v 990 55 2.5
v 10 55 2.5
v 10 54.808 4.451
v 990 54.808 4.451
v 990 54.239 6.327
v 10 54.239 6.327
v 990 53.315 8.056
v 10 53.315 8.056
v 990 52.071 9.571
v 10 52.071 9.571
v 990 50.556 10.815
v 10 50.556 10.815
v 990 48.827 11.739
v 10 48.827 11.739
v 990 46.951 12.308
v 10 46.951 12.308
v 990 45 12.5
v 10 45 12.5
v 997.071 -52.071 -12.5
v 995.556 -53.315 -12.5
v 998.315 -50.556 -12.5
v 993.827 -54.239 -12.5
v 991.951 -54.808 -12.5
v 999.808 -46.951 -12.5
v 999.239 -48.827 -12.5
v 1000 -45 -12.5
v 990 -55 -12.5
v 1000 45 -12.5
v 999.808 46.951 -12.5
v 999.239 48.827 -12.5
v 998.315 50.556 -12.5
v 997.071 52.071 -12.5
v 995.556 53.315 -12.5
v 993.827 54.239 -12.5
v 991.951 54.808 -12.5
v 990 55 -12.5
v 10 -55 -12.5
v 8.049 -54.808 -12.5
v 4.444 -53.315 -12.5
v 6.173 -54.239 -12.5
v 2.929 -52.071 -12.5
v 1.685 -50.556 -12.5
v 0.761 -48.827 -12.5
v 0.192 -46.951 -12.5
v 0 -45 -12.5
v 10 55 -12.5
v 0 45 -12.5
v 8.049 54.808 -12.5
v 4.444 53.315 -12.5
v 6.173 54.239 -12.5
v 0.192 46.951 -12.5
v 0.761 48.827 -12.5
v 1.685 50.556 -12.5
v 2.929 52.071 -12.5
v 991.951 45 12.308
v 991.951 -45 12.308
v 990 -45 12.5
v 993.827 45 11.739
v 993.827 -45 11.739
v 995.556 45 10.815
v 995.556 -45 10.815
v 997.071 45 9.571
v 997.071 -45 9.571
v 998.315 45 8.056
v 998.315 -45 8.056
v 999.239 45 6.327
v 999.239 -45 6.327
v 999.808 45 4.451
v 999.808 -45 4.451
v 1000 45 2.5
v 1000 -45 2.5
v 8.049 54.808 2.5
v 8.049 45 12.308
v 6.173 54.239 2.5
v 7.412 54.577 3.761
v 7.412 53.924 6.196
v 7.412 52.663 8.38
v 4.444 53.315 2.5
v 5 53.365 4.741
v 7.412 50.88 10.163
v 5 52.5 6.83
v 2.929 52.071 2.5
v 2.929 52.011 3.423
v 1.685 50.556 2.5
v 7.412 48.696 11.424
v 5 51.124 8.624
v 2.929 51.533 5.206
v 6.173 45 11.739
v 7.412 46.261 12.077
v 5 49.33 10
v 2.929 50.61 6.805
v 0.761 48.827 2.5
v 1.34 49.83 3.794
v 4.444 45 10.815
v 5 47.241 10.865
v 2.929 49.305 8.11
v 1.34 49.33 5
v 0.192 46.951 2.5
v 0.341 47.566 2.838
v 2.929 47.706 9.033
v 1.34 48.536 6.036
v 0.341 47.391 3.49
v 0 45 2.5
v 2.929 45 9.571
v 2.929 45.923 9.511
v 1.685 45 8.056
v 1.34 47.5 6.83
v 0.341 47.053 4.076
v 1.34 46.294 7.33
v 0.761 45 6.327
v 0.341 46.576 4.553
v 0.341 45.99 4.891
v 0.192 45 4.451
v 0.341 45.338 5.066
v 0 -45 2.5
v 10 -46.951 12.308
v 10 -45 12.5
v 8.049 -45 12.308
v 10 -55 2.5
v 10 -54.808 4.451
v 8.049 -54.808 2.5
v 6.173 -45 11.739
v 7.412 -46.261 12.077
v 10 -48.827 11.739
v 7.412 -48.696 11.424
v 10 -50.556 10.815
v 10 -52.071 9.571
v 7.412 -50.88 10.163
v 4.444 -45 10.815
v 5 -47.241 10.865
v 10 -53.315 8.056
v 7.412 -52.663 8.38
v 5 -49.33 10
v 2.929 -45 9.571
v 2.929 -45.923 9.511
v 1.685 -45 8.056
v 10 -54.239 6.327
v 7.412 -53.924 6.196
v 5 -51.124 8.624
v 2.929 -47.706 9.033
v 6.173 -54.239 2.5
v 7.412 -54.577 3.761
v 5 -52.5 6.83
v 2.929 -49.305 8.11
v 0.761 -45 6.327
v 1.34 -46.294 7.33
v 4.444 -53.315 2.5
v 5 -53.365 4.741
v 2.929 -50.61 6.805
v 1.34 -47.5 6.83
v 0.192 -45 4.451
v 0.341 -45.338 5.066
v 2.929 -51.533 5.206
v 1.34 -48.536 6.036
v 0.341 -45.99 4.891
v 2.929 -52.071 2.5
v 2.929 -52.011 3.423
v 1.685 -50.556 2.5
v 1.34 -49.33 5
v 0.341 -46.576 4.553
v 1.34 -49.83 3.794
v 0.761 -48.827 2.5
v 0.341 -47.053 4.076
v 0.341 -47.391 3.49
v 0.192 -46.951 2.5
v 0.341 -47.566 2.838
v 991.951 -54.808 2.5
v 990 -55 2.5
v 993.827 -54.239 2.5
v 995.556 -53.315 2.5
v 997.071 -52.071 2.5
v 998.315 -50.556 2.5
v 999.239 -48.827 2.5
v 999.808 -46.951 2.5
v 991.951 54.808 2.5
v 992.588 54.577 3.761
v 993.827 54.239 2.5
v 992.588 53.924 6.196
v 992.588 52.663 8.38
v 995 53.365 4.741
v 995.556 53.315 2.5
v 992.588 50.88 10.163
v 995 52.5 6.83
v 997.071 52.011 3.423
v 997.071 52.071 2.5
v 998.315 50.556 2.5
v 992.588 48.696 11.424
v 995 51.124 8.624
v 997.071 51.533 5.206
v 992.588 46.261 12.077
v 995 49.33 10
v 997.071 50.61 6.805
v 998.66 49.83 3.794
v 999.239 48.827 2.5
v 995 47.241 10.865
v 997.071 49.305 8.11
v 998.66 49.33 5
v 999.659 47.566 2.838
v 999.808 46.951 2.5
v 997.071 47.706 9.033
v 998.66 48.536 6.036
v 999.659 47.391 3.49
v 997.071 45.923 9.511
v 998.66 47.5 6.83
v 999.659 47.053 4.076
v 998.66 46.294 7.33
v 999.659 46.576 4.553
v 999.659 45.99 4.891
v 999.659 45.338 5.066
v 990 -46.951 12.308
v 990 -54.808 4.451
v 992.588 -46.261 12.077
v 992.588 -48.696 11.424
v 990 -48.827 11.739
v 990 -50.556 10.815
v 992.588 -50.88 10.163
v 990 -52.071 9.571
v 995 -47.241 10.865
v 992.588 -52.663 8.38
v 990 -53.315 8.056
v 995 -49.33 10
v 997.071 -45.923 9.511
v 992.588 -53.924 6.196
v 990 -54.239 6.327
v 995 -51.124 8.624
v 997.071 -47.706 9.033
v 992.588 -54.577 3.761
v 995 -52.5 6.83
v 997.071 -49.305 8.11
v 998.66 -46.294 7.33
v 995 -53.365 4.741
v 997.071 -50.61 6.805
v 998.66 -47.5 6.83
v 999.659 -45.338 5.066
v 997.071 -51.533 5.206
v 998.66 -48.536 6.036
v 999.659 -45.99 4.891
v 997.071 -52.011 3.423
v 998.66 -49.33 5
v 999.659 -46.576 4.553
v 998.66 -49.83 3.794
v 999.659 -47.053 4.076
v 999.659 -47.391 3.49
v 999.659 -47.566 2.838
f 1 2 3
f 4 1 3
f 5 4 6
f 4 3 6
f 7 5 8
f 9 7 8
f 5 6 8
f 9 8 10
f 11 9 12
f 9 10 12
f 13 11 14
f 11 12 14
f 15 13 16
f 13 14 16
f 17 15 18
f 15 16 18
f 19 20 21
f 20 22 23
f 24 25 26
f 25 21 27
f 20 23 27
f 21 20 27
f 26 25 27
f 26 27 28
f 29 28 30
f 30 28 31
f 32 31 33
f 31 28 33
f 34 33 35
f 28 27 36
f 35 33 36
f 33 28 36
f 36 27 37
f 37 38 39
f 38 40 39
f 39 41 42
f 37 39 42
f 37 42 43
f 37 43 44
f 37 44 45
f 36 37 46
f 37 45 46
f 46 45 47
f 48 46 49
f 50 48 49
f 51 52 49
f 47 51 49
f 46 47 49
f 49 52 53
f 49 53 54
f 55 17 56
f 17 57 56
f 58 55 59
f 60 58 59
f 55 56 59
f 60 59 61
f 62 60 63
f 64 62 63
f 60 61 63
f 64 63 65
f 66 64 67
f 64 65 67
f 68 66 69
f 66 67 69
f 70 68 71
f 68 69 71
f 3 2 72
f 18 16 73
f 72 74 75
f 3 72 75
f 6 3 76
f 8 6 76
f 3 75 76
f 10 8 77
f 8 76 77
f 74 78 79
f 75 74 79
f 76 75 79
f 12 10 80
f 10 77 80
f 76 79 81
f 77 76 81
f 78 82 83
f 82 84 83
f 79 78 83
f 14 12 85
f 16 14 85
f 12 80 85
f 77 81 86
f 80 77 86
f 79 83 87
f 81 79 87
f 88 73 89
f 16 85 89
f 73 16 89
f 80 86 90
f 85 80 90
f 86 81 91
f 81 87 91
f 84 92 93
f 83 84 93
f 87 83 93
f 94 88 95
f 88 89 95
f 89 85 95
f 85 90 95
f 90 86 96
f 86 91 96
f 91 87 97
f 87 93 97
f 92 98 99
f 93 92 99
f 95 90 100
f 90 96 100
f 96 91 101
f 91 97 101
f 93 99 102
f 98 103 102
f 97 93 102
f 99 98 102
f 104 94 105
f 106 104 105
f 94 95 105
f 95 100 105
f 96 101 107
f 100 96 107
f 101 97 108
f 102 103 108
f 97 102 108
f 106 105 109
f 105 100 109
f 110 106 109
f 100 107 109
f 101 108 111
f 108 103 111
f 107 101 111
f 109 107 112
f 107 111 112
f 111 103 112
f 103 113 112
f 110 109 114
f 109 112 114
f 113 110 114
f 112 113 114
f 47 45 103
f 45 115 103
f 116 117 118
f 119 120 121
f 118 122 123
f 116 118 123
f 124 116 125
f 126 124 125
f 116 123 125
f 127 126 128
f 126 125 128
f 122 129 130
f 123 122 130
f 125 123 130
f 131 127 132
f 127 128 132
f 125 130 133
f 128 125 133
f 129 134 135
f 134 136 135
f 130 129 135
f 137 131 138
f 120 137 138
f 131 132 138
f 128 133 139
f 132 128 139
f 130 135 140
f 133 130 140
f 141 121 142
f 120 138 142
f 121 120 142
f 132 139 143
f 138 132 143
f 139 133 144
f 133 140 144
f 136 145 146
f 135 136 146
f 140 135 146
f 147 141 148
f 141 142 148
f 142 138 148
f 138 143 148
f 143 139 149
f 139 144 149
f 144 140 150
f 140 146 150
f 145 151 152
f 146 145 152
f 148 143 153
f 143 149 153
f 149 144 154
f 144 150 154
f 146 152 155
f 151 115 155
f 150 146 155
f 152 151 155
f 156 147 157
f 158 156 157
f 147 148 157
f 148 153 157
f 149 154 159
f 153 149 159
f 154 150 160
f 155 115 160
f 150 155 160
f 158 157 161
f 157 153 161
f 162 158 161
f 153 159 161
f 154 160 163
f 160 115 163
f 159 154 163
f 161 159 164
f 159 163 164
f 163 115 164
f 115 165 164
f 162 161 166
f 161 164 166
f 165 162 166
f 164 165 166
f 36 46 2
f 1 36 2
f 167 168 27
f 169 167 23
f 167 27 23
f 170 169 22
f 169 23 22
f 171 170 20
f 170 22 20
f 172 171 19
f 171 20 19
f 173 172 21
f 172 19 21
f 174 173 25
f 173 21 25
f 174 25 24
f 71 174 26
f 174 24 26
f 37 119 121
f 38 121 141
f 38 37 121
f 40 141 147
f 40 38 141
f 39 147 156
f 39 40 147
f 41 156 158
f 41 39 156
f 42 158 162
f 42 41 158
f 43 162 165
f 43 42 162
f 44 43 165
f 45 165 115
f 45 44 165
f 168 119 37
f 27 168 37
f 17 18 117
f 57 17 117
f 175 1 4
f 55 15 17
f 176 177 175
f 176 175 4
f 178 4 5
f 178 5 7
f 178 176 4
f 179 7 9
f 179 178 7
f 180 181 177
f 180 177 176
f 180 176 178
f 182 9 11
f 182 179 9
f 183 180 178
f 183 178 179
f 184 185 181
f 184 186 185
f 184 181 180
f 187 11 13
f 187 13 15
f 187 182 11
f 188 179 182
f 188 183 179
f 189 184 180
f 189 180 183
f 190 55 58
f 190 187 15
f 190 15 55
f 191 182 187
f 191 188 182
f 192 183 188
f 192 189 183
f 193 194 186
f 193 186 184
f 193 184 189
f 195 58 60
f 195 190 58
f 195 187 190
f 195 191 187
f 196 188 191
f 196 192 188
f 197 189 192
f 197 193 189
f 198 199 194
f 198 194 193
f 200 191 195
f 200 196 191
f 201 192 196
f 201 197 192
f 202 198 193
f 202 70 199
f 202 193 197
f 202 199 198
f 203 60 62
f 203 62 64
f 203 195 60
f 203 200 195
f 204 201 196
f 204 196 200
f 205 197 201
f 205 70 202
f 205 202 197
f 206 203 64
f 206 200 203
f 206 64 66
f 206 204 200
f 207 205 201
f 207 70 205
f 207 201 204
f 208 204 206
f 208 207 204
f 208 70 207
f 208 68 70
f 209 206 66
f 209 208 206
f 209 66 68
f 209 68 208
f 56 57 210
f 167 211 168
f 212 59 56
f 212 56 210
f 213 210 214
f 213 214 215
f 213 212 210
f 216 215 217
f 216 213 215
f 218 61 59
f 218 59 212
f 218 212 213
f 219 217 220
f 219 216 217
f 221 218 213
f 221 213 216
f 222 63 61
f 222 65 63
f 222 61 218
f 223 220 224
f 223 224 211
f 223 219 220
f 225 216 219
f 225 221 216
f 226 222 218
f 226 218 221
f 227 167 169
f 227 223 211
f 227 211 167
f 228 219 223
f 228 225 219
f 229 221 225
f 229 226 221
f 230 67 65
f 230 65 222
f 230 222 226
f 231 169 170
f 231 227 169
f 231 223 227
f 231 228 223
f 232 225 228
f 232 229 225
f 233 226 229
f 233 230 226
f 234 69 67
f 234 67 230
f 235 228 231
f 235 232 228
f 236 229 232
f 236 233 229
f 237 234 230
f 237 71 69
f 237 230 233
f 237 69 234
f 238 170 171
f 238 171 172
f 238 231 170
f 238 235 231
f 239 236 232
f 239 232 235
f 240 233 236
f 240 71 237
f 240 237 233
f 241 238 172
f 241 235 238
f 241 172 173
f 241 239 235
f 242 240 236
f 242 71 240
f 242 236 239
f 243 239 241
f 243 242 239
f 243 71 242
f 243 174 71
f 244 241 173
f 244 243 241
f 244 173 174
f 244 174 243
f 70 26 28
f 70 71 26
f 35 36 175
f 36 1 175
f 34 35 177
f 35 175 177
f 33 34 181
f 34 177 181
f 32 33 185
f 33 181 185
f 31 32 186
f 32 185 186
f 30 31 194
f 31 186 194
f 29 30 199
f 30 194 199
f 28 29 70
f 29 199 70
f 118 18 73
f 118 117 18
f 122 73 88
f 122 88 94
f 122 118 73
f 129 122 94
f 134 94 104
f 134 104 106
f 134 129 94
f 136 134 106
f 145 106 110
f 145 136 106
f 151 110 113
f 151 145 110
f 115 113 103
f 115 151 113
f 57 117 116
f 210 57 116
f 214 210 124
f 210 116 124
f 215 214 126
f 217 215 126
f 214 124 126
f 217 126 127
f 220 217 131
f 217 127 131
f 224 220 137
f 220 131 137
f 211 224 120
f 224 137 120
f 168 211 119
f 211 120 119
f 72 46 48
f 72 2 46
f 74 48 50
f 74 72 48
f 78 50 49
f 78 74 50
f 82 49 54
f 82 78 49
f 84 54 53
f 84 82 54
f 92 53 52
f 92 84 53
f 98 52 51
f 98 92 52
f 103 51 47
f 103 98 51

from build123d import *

# Parameters (mm, degrees)
F1_DEPTH = 1000
F2_R     = 10


with BuildPart() as f1:
    # F0 (on Right) → F1 (new body)
    with BuildSketch(Plane.YZ):
        with BuildLine():
            Line((-55, -12.5), (55, -12.5))
            Line((55, -12.5), (55, 2.5))
            ThreePointArc((55, 2.5), (52.0710678119, 9.5710678119), (45, 12.5))
            Line((45, 12.5), (-45, 12.5))
            ThreePointArc((-45, 12.5), (-52.0710678119, 9.5710678119), (-55, 2.5))
            Line((-55, 2.5), (-55, -12.5))
        make_face()
    extrude(amount=F1_DEPTH)

    # F2
    f2_edges = [f1.edges().sort_by_distance(p)[0] for p in [
        (1000, 0, 12.5),
        (500, 45, 12.5),
        (500, -45, 12.5),
        (0, 0, 12.5),
    ]]
    fillet(f2_edges, radius=F2_R)


solid = f1.part
